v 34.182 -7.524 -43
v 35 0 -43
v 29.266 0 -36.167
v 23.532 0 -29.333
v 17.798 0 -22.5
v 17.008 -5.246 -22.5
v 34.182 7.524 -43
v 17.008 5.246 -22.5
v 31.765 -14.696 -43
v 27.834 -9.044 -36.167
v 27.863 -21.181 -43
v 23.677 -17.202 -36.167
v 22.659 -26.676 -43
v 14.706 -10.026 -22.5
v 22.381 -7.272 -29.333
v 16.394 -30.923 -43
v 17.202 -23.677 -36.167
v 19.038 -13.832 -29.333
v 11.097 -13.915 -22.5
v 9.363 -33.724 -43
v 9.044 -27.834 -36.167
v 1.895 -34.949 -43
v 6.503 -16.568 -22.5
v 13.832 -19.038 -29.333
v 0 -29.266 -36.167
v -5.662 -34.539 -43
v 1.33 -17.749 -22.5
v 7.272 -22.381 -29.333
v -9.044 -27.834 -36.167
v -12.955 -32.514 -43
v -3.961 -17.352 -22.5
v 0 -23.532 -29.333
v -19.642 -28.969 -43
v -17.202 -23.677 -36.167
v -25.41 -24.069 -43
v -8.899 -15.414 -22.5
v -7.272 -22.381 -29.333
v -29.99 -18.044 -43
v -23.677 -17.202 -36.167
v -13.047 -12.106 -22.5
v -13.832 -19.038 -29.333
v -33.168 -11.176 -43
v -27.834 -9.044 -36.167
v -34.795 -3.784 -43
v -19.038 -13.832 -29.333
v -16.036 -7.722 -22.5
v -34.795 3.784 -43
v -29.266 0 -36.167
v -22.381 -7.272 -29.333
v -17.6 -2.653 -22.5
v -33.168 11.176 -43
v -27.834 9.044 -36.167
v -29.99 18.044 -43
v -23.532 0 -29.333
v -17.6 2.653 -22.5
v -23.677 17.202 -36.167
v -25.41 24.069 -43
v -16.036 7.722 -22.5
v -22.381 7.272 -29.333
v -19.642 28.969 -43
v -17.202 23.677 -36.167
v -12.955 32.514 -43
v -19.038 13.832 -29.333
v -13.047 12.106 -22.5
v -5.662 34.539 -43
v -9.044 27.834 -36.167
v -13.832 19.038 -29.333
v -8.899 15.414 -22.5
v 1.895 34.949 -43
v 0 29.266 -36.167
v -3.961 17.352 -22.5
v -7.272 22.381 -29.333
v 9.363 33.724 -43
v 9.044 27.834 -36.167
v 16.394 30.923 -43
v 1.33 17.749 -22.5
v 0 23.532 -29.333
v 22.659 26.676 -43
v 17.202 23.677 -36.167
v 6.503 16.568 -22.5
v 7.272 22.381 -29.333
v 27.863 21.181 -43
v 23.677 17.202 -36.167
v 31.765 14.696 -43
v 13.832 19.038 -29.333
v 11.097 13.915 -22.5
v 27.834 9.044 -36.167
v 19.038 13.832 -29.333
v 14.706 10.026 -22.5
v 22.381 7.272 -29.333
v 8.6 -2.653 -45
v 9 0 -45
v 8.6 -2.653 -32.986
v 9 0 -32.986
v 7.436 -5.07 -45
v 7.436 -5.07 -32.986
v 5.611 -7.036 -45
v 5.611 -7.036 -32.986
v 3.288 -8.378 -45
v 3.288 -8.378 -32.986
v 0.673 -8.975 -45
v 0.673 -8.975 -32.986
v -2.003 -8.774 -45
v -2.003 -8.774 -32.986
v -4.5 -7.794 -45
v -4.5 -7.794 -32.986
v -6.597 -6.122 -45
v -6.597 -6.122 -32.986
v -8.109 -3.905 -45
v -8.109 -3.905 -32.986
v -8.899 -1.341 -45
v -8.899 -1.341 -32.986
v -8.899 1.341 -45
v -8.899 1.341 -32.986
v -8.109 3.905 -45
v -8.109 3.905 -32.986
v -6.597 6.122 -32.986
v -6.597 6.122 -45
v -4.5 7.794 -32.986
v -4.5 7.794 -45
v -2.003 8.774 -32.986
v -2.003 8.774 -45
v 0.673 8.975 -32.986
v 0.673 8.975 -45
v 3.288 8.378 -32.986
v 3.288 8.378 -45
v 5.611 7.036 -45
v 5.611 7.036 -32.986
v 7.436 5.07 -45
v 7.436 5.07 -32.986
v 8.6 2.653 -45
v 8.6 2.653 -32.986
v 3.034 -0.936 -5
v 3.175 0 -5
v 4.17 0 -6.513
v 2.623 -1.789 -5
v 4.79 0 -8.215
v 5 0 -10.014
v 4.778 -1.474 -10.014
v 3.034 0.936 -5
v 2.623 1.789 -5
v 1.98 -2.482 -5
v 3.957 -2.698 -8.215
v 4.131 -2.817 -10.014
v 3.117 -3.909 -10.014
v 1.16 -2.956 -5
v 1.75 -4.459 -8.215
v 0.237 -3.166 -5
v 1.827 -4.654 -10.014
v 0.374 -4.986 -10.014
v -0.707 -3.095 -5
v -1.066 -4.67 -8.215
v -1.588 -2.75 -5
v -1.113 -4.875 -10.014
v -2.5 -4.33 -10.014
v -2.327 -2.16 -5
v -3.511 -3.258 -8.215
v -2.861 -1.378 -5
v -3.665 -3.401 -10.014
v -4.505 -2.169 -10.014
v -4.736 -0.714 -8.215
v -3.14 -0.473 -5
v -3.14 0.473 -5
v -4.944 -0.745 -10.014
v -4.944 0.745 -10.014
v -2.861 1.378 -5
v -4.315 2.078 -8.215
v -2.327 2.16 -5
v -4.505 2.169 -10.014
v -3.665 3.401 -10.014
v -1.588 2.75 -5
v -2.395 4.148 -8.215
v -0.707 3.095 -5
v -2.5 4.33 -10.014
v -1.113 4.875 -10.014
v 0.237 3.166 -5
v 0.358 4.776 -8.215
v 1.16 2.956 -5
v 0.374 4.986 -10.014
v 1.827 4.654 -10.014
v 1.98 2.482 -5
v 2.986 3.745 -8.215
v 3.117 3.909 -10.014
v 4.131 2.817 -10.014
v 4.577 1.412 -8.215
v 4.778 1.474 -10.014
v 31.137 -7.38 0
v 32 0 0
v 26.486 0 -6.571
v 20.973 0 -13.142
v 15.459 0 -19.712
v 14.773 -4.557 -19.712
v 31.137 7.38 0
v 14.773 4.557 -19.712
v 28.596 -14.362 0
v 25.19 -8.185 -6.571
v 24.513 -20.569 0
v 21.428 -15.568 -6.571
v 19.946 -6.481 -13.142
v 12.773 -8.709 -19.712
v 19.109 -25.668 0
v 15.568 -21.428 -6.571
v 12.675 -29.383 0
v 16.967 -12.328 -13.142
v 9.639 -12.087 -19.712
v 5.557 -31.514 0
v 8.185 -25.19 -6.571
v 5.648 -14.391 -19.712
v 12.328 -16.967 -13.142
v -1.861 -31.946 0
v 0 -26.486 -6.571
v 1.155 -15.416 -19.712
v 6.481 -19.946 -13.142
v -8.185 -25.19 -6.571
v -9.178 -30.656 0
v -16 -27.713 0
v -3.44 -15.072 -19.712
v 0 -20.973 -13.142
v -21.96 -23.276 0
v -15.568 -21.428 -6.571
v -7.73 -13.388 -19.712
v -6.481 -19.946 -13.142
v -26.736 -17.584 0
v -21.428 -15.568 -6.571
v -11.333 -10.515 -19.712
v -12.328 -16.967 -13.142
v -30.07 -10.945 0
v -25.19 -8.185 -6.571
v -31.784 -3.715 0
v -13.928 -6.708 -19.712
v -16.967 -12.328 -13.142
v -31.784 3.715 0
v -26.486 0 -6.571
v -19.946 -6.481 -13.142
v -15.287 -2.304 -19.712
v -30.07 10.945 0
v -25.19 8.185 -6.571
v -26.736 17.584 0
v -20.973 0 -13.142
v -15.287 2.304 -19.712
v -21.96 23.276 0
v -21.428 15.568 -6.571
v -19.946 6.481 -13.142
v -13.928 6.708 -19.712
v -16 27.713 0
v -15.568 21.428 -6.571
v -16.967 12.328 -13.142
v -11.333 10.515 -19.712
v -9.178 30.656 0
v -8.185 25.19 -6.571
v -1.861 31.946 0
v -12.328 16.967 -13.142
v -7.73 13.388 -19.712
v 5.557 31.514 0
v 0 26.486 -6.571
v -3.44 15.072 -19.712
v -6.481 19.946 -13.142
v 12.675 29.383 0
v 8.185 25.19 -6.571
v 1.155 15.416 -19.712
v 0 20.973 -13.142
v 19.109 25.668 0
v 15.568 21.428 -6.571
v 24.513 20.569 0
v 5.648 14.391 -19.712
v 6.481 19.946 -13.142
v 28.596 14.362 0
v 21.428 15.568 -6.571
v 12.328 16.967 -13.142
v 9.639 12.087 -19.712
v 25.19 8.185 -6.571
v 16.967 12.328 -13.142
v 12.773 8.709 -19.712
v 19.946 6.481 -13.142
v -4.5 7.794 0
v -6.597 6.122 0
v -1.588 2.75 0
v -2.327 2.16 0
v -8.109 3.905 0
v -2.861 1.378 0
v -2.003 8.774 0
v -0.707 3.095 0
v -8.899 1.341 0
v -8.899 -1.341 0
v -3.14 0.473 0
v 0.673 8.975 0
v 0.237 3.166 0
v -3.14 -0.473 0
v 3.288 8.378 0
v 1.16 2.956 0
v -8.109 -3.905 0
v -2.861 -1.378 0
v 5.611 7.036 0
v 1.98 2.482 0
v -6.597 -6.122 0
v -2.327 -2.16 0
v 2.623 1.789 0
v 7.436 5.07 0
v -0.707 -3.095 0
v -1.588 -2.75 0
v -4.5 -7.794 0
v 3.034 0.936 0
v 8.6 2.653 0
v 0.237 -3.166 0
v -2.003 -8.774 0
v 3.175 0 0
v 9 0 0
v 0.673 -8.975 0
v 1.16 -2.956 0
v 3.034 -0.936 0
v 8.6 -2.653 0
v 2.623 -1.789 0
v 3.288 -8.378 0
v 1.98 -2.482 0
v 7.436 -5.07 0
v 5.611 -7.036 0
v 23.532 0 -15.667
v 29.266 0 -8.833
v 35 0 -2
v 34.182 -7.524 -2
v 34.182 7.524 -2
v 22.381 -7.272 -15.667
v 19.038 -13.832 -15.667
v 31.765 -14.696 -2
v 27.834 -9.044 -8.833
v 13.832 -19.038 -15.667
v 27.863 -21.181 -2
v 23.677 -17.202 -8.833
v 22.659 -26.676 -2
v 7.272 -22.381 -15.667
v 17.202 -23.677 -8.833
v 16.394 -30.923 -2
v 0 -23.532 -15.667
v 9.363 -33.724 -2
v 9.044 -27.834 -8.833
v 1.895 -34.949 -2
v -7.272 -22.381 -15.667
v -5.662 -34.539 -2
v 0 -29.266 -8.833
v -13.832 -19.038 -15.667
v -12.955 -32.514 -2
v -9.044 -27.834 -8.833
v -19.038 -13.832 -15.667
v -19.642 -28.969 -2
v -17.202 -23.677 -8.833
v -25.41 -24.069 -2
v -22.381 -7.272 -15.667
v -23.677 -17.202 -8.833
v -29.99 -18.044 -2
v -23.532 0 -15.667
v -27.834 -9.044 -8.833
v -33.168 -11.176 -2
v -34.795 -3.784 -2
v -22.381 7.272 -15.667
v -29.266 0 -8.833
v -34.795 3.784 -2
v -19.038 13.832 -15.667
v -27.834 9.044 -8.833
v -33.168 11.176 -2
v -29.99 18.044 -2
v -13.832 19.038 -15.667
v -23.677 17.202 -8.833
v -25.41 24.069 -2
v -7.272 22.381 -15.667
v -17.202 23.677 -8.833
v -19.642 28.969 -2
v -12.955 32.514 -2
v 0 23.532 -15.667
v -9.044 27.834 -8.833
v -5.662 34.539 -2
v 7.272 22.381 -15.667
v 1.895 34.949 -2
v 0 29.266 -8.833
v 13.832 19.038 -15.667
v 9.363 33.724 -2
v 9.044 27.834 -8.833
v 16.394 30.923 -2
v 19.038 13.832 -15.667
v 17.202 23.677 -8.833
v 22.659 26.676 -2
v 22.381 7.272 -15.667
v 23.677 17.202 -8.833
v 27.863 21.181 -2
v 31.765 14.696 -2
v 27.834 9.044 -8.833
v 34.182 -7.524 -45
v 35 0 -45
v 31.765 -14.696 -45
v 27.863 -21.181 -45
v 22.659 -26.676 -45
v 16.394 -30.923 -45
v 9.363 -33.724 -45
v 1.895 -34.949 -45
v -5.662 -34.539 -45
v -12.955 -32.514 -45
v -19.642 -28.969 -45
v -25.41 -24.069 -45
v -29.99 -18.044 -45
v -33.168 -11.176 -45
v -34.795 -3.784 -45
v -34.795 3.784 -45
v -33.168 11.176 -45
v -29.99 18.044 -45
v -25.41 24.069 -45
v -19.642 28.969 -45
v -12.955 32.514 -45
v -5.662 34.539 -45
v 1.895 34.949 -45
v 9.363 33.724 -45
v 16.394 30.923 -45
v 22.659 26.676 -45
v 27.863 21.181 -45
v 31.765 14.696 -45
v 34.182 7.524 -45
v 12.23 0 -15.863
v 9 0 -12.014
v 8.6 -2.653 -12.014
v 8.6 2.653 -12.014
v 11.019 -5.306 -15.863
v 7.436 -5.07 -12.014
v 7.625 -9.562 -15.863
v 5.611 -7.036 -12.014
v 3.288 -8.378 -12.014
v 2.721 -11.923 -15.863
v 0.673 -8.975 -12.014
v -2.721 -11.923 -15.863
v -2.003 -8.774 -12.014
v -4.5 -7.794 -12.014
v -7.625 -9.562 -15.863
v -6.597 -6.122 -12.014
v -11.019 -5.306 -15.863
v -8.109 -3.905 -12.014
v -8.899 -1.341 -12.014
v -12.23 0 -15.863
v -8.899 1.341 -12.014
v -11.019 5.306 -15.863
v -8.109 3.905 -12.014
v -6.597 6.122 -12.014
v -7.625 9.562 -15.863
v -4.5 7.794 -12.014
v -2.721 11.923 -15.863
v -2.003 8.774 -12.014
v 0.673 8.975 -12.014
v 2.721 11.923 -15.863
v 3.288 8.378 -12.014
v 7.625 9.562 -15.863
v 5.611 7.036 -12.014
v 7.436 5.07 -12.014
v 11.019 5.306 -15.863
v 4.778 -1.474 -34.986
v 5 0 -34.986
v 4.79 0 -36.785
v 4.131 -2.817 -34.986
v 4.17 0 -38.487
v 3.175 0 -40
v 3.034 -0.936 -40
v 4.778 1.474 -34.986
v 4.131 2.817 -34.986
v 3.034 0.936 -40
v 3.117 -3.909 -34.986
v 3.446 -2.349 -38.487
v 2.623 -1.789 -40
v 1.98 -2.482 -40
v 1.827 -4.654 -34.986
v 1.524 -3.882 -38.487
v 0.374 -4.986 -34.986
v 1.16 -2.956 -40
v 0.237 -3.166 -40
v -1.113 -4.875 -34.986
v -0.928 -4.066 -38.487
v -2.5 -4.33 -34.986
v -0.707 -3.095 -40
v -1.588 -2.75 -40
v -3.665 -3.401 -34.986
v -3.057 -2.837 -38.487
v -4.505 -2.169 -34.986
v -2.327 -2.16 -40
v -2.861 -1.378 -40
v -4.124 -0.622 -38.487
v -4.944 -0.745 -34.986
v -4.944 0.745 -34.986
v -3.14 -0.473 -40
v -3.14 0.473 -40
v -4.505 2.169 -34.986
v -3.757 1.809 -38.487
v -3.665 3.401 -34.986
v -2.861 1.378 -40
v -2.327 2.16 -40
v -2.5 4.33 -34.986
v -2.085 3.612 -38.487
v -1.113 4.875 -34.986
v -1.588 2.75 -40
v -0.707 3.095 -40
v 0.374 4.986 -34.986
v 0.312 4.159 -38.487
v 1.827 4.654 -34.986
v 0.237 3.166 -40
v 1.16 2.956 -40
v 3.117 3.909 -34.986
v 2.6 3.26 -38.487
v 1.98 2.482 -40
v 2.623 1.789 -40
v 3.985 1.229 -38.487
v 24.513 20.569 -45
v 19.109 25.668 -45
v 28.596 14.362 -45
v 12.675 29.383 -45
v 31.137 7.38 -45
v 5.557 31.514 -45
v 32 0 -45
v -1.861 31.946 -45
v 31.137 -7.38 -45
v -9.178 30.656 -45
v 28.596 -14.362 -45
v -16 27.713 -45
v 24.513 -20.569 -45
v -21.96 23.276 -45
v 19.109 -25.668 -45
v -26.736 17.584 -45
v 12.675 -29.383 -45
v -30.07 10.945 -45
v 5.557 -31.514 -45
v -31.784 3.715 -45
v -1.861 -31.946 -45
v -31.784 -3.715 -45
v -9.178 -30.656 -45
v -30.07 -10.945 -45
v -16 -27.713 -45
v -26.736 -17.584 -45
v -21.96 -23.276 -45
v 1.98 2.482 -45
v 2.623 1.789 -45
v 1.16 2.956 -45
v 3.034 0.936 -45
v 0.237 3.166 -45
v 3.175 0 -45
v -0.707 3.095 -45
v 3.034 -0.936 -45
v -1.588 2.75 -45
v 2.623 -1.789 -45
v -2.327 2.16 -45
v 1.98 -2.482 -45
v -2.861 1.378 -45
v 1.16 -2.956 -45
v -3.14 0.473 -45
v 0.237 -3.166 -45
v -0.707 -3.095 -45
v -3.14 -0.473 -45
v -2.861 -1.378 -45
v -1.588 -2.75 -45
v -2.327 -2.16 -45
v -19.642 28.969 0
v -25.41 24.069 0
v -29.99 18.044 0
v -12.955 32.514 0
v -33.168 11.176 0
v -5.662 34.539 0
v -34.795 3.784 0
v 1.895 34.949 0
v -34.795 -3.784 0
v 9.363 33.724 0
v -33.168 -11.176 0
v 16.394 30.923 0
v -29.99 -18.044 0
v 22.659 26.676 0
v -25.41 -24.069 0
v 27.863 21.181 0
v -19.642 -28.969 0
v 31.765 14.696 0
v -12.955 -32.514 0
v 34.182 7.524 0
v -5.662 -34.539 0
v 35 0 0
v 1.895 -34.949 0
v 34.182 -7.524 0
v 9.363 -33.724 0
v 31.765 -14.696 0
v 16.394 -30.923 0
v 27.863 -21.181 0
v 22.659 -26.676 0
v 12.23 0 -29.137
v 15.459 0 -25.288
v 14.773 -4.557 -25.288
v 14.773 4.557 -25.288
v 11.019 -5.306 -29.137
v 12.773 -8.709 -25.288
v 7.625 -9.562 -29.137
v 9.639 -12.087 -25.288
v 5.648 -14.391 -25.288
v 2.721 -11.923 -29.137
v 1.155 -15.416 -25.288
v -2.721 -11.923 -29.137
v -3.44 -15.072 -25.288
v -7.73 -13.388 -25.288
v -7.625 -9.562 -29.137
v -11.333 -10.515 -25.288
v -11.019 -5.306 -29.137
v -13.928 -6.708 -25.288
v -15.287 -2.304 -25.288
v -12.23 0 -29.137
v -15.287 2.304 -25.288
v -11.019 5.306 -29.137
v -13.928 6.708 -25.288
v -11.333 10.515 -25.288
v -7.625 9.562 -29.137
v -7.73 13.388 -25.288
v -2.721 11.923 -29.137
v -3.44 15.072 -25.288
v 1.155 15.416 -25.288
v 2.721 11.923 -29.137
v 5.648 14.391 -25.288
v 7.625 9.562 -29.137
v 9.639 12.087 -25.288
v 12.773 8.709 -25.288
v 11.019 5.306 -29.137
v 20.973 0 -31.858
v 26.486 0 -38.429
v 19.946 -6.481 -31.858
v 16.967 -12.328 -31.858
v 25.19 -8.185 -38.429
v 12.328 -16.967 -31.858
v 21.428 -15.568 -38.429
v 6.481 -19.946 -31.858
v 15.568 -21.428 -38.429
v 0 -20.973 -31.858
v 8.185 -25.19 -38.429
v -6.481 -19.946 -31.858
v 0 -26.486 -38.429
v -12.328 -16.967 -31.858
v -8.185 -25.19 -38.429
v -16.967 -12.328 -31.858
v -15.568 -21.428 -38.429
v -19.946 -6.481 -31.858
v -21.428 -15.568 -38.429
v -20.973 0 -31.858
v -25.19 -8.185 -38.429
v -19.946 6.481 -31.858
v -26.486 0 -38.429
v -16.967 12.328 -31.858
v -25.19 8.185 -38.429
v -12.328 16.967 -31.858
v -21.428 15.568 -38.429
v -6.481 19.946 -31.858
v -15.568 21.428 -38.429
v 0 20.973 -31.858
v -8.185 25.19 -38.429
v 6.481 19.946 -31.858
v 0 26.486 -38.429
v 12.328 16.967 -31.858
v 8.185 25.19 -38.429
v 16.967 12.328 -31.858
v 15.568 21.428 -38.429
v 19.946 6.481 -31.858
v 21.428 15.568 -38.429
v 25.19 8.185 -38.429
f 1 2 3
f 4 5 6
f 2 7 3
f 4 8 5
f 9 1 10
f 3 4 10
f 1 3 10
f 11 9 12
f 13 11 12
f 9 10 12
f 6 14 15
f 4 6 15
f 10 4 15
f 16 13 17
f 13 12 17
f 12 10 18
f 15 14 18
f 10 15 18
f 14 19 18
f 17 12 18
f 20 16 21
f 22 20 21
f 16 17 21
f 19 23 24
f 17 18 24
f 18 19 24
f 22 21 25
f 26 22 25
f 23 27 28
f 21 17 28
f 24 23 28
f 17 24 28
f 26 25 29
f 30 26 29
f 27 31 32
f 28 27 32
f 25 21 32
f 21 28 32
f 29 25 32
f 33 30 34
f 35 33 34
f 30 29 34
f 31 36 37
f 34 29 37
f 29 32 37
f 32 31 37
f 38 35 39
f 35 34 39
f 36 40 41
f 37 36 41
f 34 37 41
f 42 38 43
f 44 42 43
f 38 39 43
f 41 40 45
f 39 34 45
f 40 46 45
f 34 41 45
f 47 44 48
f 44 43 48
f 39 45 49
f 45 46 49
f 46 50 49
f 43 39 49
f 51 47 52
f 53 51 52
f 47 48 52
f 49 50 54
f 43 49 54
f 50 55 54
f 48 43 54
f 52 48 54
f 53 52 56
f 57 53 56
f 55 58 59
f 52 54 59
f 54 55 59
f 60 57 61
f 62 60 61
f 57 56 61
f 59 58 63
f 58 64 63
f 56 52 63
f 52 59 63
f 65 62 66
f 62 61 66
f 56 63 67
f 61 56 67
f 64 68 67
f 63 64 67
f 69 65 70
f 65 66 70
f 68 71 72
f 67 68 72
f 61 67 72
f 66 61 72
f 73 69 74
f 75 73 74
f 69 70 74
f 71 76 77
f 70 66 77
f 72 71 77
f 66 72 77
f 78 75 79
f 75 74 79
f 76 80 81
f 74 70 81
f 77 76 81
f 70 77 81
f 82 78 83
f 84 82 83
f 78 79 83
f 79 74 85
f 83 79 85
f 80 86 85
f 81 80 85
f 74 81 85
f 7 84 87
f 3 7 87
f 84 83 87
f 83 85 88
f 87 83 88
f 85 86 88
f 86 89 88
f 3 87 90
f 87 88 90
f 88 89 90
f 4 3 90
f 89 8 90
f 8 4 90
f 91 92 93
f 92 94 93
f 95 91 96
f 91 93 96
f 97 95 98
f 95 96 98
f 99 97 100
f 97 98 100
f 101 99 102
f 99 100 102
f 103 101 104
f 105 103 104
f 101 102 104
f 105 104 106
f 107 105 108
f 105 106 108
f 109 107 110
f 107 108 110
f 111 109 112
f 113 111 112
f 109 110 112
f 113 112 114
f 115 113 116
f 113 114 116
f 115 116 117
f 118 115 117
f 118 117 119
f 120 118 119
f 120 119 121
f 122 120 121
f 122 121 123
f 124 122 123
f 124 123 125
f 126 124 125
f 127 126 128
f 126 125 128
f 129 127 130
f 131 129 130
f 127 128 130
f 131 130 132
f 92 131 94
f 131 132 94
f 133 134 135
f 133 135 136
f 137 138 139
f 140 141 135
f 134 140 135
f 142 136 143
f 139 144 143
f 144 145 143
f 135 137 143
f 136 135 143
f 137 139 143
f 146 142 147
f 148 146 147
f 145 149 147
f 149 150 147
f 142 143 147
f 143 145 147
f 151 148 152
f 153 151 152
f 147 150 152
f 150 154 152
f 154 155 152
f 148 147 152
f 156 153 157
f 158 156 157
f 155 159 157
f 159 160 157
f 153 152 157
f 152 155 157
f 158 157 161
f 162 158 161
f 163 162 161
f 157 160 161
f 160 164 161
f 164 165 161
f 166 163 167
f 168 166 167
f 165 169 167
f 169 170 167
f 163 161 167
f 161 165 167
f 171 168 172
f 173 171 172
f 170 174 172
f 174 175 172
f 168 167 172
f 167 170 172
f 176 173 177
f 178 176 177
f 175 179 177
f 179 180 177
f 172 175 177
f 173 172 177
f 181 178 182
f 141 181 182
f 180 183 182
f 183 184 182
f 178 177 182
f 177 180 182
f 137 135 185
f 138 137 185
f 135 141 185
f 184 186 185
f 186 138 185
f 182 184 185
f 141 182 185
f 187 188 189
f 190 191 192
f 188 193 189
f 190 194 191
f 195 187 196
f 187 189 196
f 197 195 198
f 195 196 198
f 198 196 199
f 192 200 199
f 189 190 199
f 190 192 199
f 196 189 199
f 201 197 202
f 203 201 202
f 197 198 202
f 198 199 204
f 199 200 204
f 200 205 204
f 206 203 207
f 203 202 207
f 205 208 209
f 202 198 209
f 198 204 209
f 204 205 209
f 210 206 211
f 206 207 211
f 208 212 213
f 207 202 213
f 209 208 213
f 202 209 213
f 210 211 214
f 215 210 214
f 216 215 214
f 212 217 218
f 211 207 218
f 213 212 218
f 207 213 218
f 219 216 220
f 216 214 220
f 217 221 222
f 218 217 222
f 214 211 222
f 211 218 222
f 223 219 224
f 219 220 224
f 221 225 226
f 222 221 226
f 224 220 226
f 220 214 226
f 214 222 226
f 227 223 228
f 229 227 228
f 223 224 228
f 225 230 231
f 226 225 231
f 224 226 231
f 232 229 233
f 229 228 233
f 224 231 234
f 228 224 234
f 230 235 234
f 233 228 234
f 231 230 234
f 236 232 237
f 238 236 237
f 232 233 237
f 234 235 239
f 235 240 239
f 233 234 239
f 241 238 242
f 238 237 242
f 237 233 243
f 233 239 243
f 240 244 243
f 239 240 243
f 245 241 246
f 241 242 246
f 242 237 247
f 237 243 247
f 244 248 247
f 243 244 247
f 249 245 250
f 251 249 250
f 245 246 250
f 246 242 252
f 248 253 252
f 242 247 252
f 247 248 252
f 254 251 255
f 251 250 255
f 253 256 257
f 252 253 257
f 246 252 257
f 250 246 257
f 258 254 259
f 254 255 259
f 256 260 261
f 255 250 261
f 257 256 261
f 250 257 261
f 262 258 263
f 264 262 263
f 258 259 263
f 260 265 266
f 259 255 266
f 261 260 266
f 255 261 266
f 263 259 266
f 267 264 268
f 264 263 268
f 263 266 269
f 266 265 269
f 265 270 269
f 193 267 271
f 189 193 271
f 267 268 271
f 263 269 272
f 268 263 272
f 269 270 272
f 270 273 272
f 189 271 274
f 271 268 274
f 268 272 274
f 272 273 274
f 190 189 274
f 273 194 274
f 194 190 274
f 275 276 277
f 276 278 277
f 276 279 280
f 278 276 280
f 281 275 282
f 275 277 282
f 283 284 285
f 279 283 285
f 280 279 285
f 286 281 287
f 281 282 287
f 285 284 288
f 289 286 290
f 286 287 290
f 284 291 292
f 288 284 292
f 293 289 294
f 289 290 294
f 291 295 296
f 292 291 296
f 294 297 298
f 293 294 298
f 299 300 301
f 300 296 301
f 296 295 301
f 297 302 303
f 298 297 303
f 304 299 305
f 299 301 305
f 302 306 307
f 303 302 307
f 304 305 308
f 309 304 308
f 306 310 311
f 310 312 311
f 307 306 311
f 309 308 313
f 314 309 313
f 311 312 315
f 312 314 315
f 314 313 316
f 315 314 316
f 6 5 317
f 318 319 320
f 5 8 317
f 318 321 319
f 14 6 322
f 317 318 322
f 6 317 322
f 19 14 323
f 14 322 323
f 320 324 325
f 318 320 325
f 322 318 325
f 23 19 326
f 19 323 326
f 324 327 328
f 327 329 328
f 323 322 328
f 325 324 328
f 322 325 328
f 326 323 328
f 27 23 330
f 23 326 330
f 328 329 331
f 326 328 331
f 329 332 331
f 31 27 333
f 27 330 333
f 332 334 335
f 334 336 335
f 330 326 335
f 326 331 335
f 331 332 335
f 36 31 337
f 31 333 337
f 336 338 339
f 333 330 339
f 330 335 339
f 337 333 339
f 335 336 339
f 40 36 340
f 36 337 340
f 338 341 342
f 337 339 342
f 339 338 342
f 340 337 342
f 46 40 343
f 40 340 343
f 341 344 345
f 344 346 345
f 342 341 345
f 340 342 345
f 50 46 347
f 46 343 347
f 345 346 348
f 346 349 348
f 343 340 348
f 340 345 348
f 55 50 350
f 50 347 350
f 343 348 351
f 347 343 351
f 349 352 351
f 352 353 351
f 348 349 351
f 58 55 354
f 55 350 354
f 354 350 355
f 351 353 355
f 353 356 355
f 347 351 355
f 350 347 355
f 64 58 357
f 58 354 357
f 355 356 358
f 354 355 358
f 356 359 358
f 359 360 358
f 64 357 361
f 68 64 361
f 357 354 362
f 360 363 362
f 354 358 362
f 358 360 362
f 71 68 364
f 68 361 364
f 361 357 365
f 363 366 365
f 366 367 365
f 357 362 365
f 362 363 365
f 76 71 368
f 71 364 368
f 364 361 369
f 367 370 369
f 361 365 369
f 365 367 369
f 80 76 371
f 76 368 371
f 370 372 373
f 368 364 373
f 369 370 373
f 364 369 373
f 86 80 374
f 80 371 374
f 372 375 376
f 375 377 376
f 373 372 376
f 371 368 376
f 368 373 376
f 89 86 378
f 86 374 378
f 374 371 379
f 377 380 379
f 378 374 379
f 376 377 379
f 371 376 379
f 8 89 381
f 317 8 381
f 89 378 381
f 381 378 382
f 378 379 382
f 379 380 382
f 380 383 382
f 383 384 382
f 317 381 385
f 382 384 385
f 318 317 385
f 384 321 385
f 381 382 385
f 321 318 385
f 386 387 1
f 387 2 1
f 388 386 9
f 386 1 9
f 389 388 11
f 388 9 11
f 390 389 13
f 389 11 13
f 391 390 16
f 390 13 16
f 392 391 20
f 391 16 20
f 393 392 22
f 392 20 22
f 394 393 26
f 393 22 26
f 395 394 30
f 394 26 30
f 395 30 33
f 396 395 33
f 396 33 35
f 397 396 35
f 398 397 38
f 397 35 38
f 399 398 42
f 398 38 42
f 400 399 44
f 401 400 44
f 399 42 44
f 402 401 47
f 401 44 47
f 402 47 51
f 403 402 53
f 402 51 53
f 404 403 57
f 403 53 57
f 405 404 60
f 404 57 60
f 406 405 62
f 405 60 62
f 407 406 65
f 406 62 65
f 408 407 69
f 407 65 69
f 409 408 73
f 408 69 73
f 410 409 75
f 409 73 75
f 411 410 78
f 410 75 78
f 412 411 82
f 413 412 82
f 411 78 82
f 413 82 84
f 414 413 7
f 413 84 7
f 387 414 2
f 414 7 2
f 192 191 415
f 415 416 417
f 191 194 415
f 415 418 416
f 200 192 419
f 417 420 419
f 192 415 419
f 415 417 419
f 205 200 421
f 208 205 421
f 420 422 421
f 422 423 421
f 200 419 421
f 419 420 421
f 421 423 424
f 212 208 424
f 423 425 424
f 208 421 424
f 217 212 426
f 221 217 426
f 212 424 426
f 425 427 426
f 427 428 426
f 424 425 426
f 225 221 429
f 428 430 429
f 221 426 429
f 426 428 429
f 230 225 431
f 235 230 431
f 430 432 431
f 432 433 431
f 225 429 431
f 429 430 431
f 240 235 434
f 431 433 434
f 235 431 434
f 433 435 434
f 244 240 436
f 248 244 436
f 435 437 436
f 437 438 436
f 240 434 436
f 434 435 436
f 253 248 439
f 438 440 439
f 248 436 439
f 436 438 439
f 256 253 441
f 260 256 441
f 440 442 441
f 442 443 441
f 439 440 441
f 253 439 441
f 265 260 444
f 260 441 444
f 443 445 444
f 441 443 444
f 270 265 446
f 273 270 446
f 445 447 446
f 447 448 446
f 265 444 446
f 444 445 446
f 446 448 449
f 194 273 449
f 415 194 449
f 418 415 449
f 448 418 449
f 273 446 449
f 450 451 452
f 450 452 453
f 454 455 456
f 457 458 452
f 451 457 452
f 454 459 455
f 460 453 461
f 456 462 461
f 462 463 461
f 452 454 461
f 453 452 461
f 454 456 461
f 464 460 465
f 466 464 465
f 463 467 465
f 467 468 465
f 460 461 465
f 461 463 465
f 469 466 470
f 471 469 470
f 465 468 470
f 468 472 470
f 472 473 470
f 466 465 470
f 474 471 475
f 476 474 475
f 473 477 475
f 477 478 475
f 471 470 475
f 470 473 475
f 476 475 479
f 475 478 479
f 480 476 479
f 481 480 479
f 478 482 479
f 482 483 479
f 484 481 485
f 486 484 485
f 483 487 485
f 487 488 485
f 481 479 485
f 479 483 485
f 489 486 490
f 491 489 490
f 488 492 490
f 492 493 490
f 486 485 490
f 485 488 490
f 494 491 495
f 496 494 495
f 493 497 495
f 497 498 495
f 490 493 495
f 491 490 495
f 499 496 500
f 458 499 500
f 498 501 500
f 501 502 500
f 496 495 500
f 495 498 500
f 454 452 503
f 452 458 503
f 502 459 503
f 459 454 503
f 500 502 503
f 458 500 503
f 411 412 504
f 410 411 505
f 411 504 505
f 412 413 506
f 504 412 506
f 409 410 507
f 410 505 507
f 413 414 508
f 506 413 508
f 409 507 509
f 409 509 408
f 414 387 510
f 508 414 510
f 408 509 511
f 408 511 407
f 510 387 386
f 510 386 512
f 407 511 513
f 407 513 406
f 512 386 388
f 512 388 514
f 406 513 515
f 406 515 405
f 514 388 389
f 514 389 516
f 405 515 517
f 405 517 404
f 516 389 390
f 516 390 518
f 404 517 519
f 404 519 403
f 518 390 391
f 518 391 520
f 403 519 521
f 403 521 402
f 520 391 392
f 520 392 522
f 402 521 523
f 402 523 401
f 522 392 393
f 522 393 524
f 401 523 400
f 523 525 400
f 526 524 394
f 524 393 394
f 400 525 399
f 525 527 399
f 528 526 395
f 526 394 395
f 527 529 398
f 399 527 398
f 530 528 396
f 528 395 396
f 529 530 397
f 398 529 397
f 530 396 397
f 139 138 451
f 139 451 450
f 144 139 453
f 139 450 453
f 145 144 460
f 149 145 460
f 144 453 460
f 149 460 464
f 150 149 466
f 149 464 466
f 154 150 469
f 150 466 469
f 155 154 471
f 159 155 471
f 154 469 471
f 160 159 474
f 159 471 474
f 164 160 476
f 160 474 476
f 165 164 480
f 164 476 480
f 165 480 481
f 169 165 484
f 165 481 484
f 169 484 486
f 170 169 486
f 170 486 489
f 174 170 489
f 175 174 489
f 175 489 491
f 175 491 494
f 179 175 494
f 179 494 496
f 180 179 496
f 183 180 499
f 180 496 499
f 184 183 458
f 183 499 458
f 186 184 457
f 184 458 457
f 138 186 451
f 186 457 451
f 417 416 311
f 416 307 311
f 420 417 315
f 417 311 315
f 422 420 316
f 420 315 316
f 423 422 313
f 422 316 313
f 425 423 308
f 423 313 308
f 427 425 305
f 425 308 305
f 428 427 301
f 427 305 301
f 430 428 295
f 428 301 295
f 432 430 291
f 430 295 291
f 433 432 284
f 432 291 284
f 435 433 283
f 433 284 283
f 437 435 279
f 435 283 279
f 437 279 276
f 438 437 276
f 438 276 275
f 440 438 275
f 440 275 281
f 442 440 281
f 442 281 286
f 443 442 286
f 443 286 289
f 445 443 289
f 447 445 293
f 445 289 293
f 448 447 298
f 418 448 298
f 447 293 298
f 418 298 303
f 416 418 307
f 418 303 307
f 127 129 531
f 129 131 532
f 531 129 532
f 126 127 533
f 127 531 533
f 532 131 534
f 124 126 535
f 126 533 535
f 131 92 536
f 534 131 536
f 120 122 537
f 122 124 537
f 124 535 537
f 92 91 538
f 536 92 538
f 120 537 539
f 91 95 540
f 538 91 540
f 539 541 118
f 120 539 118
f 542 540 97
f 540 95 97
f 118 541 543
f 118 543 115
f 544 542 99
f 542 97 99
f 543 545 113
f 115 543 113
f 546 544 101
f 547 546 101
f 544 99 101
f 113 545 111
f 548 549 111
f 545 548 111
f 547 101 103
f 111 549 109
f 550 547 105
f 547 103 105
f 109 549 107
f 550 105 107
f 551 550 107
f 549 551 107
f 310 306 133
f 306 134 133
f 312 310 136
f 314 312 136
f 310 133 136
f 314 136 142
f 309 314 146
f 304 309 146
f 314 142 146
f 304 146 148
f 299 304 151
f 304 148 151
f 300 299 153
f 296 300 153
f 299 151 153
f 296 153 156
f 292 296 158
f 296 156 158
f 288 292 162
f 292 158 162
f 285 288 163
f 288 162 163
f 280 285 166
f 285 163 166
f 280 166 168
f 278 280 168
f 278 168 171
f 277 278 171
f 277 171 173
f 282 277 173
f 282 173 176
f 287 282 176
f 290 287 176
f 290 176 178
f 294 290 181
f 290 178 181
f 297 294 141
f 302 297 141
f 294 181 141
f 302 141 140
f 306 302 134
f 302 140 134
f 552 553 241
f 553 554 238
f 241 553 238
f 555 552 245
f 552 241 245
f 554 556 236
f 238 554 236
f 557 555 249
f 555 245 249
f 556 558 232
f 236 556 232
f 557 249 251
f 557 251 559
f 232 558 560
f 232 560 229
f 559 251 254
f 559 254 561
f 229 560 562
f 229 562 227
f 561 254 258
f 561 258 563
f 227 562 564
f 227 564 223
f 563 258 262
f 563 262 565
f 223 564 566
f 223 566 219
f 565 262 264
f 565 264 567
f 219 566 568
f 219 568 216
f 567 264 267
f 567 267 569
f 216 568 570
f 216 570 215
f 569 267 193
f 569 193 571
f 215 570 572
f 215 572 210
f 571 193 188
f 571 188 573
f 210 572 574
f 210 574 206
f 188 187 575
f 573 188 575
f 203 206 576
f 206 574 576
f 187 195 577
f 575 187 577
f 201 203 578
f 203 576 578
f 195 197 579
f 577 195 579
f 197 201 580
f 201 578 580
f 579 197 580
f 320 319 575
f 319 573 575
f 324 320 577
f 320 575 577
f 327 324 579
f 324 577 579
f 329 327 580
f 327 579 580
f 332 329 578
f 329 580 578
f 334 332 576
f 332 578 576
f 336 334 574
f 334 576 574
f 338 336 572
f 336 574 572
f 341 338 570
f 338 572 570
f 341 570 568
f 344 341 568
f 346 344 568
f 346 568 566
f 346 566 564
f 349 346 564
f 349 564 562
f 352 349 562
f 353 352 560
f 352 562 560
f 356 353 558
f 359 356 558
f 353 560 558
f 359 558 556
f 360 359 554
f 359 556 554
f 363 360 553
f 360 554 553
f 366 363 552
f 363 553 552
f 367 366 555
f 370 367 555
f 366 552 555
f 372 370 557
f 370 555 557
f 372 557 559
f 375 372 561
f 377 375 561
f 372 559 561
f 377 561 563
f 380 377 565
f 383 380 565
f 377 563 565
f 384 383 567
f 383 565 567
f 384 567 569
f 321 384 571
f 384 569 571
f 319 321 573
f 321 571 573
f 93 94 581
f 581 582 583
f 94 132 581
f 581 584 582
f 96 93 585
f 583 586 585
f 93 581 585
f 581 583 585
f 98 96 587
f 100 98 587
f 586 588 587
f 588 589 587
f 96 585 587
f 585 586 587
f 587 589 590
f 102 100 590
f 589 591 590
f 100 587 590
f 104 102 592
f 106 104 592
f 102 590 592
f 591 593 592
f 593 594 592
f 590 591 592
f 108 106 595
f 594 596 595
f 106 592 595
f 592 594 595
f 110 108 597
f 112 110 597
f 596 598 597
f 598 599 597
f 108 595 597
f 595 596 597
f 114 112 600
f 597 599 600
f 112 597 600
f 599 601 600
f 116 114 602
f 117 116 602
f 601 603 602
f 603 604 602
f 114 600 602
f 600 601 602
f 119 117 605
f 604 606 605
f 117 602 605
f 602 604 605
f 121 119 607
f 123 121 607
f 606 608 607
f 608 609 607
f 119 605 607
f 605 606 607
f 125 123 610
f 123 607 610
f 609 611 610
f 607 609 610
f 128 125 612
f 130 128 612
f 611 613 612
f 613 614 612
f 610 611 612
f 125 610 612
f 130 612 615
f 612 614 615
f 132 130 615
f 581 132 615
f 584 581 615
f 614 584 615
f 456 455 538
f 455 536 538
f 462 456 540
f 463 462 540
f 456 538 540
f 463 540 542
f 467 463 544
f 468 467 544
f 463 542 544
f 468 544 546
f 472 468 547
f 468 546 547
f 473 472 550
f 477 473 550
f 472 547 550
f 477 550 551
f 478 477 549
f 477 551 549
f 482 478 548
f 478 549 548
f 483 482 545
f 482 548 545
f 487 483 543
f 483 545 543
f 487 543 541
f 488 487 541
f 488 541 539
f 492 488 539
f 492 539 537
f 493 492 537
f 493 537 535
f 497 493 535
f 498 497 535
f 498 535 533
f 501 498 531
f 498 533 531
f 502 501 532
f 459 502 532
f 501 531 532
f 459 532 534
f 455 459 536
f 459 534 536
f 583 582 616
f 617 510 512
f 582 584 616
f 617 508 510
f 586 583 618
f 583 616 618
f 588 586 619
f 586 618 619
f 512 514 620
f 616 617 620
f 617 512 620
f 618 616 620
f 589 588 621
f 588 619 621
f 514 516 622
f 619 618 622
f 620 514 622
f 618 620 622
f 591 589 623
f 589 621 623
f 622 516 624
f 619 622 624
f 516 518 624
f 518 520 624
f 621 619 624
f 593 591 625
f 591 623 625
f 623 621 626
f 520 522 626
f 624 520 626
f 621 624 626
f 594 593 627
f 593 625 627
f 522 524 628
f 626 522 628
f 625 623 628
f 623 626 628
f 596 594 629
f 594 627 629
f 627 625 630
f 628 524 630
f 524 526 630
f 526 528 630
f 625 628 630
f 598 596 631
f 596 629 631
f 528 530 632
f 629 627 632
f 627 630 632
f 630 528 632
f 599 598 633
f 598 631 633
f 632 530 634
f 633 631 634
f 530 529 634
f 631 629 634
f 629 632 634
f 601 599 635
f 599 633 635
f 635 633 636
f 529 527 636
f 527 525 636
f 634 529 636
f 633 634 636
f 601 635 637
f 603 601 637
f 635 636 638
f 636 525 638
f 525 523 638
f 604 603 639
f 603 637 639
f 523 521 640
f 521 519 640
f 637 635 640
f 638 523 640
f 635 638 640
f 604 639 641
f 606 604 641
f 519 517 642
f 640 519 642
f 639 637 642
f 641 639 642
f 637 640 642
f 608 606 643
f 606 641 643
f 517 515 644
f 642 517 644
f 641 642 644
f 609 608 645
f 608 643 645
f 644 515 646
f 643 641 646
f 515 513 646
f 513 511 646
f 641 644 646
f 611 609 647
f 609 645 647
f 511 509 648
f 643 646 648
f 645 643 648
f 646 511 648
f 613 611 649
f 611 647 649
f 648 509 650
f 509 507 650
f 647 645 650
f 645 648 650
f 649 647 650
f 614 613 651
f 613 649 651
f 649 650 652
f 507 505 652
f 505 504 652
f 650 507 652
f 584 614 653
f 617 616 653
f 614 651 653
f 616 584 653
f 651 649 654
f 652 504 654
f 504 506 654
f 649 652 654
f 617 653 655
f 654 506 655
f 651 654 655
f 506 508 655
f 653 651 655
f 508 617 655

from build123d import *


with BuildPart() as part:
    # Sketch1 → Revolve1 (revolve)
    with BuildSketch(Plane(origin=(0, 0, 0), x_dir=(1, 0, 0), z_dir=(0, 1, 0))):
        with BuildLine():
            Line((3.175, 0), (3.175, 5))
            ThreePointArc((3.175, 5), (4.529564638, 7.346174775), (5, 10.014146291))
            Line((5, 10.014146291), (5, 34.985853709))
            ThreePointArc((5, 34.985853709), (4.529564638, 37.653825225), (3.175, 40))
            Line((3.175, 40), (3.175, 45))
            Line((3.175, 45), (9, 45))
            Line((9, 45), (9, 32.985593407))
            Line((9, 32.985593407), (15.45935793, 25.287630389))
            Line((15.45935793, 25.287630389), (32, 45))
            Line((32, 45), (35, 45))
            Line((35, 45), (35, 43))
            Line((35, 43), (17.798457561, 22.5))
            Line((17.798457561, 22.5), (35, 2))
            Line((35, 2), (35, 0))
            Line((35, 0), (32, 0))
            Line((32, 0), (15.45935793, 19.712369611))
            Line((15.45935793, 19.712369611), (9, 12.014406593))
            Line((9, 12.014406593), (9, 0))
            Line((9, 0), (3.175, 0))
        make_face()
    revolve(axis=Axis((0, 0, 0), (0, 0, -1)))


solid = part.part
